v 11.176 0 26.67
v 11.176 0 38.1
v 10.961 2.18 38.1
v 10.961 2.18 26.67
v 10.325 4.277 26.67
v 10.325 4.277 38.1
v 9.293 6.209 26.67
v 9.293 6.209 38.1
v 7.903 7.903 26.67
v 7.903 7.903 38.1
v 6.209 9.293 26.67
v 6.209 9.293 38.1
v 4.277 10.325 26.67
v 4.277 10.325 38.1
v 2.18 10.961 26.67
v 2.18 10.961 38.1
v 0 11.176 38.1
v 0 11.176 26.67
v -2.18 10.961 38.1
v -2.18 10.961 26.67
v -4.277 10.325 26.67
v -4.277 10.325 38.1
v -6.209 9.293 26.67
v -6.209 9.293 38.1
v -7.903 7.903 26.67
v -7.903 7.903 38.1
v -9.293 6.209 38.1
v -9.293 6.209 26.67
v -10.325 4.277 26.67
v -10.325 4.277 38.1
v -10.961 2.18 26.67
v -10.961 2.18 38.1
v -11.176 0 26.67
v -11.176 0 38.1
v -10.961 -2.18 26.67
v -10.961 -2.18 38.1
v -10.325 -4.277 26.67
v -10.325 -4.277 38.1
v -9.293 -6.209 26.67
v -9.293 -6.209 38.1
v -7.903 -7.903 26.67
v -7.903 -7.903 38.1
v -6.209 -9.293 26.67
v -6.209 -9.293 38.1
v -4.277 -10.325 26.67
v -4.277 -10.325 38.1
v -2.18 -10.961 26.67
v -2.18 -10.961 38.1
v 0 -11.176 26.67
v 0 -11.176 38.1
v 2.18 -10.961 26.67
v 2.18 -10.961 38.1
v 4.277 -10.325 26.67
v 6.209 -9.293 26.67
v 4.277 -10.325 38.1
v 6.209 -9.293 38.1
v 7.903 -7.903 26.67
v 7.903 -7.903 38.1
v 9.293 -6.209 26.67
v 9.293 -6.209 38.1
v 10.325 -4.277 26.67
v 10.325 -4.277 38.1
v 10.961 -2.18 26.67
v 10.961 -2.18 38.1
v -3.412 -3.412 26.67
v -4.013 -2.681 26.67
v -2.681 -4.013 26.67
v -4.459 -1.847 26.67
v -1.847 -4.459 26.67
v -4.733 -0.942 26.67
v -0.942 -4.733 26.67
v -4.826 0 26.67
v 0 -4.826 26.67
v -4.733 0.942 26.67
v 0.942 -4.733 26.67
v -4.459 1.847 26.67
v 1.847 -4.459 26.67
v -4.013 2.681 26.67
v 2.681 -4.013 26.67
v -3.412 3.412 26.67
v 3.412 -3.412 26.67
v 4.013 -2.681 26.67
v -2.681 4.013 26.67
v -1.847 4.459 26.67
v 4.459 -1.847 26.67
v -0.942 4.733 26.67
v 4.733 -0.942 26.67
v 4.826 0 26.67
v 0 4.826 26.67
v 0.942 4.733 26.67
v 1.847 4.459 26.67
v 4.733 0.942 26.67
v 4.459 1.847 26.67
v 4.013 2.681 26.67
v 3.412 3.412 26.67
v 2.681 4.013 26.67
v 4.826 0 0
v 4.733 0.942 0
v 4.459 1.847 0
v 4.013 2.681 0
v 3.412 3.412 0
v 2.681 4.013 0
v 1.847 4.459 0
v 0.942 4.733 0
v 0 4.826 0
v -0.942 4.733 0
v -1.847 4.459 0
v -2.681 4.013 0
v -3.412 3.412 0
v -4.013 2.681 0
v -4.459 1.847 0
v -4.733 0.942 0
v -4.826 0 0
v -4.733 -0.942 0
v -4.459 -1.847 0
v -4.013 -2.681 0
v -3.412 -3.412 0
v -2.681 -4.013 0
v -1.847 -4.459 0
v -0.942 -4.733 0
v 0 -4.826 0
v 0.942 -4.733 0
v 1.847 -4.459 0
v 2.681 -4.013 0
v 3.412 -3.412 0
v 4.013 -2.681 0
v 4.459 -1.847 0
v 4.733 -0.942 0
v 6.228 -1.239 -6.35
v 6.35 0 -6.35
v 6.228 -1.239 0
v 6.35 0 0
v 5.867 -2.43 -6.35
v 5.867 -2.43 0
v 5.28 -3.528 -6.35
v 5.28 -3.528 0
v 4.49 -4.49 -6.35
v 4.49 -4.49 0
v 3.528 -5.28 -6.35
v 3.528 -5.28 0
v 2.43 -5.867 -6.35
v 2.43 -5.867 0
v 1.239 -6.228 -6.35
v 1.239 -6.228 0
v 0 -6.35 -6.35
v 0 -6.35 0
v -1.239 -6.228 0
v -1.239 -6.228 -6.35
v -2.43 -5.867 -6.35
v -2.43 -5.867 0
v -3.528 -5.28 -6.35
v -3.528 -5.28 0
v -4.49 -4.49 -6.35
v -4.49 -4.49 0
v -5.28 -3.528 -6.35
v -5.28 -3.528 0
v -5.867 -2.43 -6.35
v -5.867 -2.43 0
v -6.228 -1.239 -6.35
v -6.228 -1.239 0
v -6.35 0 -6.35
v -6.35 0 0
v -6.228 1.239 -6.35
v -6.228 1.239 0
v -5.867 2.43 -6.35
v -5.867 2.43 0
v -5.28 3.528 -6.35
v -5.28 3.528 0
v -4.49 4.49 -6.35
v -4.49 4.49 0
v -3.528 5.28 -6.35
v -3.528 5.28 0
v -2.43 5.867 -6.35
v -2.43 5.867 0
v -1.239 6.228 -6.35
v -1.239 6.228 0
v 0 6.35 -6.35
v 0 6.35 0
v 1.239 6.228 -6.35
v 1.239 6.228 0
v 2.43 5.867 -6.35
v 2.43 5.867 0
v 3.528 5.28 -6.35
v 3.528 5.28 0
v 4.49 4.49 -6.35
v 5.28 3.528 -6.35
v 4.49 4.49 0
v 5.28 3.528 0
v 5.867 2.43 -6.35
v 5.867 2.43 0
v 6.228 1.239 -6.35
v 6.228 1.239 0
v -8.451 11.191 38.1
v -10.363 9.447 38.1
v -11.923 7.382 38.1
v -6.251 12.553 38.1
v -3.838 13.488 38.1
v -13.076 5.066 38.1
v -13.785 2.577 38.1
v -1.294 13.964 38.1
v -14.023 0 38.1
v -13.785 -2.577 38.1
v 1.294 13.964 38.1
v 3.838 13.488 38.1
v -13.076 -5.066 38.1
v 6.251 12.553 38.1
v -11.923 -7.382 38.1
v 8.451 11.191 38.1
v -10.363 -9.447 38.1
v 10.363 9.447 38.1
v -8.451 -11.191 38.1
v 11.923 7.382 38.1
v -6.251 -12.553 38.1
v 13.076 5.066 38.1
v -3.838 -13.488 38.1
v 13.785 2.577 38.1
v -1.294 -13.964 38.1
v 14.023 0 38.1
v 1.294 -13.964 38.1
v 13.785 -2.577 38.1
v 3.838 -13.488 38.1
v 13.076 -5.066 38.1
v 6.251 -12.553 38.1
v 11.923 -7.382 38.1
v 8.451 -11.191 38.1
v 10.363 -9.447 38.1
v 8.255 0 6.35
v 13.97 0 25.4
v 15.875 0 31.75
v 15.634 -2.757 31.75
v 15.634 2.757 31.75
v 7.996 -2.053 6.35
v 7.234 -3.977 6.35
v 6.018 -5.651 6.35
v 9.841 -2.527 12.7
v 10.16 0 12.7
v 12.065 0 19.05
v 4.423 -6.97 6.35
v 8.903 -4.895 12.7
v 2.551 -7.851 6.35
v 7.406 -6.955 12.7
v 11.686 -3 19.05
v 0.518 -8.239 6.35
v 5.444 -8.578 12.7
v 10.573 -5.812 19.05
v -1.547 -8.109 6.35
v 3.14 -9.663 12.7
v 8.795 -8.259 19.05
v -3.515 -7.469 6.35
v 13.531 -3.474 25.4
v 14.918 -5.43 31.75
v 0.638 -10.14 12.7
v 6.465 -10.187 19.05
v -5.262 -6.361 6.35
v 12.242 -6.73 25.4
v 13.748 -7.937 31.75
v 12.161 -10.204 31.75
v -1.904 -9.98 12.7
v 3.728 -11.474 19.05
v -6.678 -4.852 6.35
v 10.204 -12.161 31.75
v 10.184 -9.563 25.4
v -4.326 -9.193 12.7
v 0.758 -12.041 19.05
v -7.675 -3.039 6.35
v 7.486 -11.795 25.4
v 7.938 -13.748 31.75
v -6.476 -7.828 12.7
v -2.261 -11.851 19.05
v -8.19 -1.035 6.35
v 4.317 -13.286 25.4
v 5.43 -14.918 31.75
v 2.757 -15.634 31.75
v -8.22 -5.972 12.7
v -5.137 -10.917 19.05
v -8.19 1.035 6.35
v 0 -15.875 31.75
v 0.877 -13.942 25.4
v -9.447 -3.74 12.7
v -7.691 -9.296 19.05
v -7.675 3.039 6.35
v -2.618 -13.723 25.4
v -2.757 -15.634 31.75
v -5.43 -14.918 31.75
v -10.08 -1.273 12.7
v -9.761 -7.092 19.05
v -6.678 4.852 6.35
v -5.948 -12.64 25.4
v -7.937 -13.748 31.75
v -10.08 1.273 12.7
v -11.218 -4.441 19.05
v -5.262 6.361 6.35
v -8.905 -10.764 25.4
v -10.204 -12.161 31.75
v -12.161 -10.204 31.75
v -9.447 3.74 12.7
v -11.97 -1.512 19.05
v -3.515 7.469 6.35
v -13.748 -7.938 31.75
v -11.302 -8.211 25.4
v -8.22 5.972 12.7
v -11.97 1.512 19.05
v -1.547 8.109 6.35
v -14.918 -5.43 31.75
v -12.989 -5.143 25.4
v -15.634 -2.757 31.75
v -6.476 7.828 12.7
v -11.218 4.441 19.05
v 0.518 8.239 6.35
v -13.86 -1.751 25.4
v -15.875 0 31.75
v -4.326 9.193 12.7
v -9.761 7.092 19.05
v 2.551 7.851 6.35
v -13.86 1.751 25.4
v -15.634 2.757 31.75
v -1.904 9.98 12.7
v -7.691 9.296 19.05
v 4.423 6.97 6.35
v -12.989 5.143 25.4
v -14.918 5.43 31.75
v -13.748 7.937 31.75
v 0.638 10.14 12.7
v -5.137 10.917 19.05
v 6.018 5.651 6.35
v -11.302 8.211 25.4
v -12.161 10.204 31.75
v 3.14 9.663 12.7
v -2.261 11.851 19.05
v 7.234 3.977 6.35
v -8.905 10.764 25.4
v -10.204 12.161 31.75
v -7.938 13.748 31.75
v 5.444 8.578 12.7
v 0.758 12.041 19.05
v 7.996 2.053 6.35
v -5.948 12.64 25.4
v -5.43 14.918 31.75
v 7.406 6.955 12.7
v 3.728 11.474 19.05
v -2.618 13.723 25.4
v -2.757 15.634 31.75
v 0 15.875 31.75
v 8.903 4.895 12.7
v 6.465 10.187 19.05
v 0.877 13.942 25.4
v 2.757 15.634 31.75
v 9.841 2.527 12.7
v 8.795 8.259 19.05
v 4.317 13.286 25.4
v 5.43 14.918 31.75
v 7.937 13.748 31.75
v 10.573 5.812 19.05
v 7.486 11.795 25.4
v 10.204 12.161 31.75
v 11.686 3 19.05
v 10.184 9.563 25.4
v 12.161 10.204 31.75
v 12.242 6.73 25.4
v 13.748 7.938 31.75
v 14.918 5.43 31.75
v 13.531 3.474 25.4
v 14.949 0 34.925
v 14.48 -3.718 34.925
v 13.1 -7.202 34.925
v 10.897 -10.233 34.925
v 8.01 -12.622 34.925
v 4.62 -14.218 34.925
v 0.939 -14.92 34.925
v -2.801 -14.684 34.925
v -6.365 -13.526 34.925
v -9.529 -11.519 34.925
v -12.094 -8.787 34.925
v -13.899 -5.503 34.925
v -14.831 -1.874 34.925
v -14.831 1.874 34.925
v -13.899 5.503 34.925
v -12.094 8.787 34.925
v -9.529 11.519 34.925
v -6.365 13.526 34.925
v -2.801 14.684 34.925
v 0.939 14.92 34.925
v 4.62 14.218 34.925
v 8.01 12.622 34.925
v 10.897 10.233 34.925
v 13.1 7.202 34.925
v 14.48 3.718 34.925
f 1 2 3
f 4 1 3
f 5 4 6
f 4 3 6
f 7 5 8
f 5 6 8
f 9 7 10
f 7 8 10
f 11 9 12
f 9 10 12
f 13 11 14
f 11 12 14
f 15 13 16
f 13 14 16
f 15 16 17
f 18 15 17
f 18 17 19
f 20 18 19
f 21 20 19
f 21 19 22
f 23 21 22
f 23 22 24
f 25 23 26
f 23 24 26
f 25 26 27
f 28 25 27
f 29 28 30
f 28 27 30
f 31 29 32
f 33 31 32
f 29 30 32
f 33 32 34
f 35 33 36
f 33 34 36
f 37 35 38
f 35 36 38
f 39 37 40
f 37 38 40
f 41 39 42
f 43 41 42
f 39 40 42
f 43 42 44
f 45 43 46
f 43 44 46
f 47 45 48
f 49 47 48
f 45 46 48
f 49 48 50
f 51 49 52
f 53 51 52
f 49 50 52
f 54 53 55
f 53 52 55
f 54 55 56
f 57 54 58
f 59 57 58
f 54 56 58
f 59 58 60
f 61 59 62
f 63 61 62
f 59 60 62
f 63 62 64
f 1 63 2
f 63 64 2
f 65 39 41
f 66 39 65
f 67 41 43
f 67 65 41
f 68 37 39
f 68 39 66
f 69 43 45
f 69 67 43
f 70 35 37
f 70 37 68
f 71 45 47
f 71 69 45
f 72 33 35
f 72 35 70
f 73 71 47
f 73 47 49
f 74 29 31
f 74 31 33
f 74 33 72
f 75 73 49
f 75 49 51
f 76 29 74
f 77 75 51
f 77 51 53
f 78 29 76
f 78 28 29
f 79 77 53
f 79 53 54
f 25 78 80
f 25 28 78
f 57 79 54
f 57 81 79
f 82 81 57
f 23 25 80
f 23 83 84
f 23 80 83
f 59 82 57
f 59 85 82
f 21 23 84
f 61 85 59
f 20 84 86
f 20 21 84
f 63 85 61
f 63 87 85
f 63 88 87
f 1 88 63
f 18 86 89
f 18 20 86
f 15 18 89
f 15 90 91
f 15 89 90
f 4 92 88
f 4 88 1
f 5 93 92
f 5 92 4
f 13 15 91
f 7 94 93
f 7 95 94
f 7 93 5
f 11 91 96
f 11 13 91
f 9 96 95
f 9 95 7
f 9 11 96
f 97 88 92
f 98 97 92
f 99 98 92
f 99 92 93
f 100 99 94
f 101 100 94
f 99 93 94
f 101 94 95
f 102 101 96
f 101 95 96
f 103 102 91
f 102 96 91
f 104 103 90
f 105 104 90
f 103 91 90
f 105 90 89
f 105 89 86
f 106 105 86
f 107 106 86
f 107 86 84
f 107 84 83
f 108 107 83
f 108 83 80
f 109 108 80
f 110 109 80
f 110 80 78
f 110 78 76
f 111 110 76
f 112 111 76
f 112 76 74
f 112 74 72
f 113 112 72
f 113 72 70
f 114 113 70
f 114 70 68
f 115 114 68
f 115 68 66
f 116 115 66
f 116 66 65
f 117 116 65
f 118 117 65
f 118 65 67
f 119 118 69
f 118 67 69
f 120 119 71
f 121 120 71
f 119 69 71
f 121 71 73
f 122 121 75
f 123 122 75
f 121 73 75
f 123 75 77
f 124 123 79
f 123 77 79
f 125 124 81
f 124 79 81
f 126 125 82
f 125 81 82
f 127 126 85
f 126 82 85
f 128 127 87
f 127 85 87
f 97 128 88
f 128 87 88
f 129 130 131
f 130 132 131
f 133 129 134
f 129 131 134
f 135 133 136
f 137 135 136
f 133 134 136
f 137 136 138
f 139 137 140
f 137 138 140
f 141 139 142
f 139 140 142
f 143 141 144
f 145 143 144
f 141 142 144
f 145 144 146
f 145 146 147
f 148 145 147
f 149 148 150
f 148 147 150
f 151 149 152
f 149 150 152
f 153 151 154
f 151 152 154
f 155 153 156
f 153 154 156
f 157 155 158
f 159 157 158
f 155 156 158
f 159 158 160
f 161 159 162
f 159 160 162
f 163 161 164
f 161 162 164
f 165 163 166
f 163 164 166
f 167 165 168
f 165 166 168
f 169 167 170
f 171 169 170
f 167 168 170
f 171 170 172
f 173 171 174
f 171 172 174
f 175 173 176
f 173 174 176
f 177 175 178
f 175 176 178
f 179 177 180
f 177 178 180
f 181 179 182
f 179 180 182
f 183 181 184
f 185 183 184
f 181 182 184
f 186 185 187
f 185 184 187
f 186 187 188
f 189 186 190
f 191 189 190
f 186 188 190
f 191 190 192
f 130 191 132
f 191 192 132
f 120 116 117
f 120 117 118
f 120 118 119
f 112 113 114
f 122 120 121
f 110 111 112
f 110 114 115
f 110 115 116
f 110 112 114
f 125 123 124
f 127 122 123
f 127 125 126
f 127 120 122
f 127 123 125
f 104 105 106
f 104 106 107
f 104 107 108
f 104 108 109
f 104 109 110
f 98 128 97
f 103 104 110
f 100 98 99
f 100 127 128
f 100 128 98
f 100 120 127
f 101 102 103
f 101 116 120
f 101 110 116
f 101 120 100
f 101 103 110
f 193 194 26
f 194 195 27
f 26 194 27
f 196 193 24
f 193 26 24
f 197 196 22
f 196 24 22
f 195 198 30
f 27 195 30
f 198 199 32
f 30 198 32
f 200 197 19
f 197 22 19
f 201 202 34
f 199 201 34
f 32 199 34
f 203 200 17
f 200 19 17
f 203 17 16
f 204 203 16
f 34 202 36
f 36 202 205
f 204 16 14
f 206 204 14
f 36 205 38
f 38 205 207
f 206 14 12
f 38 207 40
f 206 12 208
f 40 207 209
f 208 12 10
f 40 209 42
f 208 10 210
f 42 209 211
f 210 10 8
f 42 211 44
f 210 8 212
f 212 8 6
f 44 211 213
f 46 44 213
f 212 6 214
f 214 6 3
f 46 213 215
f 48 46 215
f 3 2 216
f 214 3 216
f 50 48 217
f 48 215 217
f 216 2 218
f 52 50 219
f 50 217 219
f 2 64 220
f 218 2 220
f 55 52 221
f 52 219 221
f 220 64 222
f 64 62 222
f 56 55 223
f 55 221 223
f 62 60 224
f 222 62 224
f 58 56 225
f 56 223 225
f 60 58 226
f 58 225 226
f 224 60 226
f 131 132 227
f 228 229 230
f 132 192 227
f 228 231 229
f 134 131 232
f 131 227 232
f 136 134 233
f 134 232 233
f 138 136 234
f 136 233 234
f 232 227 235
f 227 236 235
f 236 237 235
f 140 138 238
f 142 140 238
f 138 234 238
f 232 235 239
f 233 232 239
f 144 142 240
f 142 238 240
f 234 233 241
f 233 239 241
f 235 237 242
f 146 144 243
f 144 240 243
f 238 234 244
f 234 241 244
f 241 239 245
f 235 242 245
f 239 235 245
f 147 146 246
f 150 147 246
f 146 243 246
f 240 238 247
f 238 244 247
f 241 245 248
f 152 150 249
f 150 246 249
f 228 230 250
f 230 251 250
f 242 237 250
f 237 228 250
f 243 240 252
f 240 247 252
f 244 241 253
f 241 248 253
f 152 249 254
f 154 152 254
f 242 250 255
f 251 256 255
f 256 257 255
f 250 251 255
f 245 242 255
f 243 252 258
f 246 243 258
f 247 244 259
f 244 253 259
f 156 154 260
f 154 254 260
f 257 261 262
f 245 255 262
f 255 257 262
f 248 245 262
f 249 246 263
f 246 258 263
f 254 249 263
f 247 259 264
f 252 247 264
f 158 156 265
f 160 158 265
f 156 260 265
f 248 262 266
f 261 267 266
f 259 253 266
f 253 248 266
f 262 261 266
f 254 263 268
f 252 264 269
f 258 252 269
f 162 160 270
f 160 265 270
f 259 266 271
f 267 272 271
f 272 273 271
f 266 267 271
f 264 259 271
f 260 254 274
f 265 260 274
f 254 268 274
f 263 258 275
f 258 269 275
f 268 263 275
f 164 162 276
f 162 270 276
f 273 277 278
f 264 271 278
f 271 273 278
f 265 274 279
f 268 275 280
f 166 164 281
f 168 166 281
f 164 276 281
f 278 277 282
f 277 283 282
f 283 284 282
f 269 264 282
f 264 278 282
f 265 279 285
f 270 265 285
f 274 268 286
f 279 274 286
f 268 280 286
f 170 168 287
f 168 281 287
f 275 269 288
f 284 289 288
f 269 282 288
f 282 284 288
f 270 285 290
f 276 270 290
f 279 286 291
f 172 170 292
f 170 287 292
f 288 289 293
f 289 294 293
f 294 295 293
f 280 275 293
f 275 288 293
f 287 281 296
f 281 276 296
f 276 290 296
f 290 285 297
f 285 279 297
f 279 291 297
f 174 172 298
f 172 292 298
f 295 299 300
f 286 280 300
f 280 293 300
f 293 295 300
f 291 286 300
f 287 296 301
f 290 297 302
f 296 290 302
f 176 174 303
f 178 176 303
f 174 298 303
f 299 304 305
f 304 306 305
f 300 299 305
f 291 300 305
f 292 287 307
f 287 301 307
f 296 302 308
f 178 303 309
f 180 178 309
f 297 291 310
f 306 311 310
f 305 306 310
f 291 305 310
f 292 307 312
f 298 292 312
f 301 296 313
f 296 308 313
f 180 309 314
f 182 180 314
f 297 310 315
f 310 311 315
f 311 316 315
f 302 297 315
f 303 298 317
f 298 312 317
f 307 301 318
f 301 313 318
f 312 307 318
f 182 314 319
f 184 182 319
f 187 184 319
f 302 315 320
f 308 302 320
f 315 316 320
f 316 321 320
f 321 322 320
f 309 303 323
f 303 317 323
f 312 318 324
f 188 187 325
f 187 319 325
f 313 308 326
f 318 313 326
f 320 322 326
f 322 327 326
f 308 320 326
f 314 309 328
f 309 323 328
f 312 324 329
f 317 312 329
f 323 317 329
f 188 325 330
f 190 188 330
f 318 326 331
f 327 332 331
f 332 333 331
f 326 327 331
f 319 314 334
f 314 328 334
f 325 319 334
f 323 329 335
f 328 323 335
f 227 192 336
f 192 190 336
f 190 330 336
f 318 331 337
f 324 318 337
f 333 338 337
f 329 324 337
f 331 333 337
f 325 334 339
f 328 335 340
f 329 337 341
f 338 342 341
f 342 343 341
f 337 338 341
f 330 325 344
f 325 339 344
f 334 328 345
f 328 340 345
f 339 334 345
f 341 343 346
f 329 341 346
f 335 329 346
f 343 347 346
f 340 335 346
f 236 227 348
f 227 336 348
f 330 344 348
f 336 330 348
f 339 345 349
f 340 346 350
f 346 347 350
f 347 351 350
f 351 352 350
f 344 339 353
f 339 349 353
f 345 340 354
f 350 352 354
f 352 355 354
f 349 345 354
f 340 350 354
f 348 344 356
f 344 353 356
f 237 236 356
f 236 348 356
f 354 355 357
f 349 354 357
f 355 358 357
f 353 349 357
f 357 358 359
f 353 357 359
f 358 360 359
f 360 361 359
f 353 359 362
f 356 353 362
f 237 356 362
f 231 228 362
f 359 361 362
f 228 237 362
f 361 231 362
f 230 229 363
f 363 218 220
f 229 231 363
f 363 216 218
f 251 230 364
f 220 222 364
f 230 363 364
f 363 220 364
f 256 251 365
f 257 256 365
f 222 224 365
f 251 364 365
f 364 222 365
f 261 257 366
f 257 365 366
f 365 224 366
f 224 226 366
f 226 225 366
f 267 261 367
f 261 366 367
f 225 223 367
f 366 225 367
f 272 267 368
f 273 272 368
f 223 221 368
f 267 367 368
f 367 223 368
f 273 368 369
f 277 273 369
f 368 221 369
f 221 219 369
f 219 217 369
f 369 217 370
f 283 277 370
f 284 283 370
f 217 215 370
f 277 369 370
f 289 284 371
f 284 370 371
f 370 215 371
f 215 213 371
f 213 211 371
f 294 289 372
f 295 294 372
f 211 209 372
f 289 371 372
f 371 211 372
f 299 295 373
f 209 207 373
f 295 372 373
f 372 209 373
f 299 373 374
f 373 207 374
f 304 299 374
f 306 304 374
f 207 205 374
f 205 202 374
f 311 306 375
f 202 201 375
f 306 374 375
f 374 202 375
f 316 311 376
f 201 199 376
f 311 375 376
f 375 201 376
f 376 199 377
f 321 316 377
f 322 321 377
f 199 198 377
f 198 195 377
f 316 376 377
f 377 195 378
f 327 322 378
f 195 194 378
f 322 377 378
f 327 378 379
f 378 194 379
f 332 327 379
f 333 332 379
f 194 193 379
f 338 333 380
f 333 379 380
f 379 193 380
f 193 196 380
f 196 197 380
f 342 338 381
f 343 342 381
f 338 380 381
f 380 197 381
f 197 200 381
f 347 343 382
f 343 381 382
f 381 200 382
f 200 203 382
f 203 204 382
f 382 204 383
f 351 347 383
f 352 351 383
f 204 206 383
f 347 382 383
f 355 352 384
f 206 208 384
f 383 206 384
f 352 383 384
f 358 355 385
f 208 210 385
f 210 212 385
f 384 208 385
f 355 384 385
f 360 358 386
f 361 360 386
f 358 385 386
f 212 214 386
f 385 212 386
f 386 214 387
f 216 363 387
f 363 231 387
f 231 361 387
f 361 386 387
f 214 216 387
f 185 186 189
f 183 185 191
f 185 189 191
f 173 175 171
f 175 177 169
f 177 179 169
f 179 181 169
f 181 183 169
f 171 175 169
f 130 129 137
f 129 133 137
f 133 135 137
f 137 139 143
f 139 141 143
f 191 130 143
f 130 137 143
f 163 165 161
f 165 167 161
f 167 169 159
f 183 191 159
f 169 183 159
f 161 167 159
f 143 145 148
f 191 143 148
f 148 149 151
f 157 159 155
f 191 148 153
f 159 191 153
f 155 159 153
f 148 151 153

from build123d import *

# Parameters (mm, degrees)
F0_W     = 6.35
F0_H     = 6.35
F2_R     = 11.176
F3_DEPTH = 11.43
F4_R     = 4.826
F5_DEPTH = 38.1


with BuildPart() as f1:
    # F0 (on Front) → F1 (revolve)
    with BuildSketch(Plane.XZ):
        Polygon((0, 38.1), (0, 0), (6.35, 0), (15.875, 31.75), (14.02334, 38.1), align=None)
        with Locations((3.175, -3.175)):
            Rectangle(F0_W, F0_H)
    revolve(axis=Axis((0, 0, 19.05), (0, 0, -1)))

    # F2 (on face) → F3 (cut)
    with BuildSketch(Plane.XY.offset(38.1)):
        Circle(F2_R)
    extrude(amount=-F3_DEPTH, mode=Mode.SUBTRACT)

    # F4 (on face) → F5 (cut)
    with BuildSketch(Plane.XY.offset(38.1)):
        Circle(F4_R)
    extrude(amount=-F5_DEPTH, mode=Mode.SUBTRACT)


solid = f1.part
